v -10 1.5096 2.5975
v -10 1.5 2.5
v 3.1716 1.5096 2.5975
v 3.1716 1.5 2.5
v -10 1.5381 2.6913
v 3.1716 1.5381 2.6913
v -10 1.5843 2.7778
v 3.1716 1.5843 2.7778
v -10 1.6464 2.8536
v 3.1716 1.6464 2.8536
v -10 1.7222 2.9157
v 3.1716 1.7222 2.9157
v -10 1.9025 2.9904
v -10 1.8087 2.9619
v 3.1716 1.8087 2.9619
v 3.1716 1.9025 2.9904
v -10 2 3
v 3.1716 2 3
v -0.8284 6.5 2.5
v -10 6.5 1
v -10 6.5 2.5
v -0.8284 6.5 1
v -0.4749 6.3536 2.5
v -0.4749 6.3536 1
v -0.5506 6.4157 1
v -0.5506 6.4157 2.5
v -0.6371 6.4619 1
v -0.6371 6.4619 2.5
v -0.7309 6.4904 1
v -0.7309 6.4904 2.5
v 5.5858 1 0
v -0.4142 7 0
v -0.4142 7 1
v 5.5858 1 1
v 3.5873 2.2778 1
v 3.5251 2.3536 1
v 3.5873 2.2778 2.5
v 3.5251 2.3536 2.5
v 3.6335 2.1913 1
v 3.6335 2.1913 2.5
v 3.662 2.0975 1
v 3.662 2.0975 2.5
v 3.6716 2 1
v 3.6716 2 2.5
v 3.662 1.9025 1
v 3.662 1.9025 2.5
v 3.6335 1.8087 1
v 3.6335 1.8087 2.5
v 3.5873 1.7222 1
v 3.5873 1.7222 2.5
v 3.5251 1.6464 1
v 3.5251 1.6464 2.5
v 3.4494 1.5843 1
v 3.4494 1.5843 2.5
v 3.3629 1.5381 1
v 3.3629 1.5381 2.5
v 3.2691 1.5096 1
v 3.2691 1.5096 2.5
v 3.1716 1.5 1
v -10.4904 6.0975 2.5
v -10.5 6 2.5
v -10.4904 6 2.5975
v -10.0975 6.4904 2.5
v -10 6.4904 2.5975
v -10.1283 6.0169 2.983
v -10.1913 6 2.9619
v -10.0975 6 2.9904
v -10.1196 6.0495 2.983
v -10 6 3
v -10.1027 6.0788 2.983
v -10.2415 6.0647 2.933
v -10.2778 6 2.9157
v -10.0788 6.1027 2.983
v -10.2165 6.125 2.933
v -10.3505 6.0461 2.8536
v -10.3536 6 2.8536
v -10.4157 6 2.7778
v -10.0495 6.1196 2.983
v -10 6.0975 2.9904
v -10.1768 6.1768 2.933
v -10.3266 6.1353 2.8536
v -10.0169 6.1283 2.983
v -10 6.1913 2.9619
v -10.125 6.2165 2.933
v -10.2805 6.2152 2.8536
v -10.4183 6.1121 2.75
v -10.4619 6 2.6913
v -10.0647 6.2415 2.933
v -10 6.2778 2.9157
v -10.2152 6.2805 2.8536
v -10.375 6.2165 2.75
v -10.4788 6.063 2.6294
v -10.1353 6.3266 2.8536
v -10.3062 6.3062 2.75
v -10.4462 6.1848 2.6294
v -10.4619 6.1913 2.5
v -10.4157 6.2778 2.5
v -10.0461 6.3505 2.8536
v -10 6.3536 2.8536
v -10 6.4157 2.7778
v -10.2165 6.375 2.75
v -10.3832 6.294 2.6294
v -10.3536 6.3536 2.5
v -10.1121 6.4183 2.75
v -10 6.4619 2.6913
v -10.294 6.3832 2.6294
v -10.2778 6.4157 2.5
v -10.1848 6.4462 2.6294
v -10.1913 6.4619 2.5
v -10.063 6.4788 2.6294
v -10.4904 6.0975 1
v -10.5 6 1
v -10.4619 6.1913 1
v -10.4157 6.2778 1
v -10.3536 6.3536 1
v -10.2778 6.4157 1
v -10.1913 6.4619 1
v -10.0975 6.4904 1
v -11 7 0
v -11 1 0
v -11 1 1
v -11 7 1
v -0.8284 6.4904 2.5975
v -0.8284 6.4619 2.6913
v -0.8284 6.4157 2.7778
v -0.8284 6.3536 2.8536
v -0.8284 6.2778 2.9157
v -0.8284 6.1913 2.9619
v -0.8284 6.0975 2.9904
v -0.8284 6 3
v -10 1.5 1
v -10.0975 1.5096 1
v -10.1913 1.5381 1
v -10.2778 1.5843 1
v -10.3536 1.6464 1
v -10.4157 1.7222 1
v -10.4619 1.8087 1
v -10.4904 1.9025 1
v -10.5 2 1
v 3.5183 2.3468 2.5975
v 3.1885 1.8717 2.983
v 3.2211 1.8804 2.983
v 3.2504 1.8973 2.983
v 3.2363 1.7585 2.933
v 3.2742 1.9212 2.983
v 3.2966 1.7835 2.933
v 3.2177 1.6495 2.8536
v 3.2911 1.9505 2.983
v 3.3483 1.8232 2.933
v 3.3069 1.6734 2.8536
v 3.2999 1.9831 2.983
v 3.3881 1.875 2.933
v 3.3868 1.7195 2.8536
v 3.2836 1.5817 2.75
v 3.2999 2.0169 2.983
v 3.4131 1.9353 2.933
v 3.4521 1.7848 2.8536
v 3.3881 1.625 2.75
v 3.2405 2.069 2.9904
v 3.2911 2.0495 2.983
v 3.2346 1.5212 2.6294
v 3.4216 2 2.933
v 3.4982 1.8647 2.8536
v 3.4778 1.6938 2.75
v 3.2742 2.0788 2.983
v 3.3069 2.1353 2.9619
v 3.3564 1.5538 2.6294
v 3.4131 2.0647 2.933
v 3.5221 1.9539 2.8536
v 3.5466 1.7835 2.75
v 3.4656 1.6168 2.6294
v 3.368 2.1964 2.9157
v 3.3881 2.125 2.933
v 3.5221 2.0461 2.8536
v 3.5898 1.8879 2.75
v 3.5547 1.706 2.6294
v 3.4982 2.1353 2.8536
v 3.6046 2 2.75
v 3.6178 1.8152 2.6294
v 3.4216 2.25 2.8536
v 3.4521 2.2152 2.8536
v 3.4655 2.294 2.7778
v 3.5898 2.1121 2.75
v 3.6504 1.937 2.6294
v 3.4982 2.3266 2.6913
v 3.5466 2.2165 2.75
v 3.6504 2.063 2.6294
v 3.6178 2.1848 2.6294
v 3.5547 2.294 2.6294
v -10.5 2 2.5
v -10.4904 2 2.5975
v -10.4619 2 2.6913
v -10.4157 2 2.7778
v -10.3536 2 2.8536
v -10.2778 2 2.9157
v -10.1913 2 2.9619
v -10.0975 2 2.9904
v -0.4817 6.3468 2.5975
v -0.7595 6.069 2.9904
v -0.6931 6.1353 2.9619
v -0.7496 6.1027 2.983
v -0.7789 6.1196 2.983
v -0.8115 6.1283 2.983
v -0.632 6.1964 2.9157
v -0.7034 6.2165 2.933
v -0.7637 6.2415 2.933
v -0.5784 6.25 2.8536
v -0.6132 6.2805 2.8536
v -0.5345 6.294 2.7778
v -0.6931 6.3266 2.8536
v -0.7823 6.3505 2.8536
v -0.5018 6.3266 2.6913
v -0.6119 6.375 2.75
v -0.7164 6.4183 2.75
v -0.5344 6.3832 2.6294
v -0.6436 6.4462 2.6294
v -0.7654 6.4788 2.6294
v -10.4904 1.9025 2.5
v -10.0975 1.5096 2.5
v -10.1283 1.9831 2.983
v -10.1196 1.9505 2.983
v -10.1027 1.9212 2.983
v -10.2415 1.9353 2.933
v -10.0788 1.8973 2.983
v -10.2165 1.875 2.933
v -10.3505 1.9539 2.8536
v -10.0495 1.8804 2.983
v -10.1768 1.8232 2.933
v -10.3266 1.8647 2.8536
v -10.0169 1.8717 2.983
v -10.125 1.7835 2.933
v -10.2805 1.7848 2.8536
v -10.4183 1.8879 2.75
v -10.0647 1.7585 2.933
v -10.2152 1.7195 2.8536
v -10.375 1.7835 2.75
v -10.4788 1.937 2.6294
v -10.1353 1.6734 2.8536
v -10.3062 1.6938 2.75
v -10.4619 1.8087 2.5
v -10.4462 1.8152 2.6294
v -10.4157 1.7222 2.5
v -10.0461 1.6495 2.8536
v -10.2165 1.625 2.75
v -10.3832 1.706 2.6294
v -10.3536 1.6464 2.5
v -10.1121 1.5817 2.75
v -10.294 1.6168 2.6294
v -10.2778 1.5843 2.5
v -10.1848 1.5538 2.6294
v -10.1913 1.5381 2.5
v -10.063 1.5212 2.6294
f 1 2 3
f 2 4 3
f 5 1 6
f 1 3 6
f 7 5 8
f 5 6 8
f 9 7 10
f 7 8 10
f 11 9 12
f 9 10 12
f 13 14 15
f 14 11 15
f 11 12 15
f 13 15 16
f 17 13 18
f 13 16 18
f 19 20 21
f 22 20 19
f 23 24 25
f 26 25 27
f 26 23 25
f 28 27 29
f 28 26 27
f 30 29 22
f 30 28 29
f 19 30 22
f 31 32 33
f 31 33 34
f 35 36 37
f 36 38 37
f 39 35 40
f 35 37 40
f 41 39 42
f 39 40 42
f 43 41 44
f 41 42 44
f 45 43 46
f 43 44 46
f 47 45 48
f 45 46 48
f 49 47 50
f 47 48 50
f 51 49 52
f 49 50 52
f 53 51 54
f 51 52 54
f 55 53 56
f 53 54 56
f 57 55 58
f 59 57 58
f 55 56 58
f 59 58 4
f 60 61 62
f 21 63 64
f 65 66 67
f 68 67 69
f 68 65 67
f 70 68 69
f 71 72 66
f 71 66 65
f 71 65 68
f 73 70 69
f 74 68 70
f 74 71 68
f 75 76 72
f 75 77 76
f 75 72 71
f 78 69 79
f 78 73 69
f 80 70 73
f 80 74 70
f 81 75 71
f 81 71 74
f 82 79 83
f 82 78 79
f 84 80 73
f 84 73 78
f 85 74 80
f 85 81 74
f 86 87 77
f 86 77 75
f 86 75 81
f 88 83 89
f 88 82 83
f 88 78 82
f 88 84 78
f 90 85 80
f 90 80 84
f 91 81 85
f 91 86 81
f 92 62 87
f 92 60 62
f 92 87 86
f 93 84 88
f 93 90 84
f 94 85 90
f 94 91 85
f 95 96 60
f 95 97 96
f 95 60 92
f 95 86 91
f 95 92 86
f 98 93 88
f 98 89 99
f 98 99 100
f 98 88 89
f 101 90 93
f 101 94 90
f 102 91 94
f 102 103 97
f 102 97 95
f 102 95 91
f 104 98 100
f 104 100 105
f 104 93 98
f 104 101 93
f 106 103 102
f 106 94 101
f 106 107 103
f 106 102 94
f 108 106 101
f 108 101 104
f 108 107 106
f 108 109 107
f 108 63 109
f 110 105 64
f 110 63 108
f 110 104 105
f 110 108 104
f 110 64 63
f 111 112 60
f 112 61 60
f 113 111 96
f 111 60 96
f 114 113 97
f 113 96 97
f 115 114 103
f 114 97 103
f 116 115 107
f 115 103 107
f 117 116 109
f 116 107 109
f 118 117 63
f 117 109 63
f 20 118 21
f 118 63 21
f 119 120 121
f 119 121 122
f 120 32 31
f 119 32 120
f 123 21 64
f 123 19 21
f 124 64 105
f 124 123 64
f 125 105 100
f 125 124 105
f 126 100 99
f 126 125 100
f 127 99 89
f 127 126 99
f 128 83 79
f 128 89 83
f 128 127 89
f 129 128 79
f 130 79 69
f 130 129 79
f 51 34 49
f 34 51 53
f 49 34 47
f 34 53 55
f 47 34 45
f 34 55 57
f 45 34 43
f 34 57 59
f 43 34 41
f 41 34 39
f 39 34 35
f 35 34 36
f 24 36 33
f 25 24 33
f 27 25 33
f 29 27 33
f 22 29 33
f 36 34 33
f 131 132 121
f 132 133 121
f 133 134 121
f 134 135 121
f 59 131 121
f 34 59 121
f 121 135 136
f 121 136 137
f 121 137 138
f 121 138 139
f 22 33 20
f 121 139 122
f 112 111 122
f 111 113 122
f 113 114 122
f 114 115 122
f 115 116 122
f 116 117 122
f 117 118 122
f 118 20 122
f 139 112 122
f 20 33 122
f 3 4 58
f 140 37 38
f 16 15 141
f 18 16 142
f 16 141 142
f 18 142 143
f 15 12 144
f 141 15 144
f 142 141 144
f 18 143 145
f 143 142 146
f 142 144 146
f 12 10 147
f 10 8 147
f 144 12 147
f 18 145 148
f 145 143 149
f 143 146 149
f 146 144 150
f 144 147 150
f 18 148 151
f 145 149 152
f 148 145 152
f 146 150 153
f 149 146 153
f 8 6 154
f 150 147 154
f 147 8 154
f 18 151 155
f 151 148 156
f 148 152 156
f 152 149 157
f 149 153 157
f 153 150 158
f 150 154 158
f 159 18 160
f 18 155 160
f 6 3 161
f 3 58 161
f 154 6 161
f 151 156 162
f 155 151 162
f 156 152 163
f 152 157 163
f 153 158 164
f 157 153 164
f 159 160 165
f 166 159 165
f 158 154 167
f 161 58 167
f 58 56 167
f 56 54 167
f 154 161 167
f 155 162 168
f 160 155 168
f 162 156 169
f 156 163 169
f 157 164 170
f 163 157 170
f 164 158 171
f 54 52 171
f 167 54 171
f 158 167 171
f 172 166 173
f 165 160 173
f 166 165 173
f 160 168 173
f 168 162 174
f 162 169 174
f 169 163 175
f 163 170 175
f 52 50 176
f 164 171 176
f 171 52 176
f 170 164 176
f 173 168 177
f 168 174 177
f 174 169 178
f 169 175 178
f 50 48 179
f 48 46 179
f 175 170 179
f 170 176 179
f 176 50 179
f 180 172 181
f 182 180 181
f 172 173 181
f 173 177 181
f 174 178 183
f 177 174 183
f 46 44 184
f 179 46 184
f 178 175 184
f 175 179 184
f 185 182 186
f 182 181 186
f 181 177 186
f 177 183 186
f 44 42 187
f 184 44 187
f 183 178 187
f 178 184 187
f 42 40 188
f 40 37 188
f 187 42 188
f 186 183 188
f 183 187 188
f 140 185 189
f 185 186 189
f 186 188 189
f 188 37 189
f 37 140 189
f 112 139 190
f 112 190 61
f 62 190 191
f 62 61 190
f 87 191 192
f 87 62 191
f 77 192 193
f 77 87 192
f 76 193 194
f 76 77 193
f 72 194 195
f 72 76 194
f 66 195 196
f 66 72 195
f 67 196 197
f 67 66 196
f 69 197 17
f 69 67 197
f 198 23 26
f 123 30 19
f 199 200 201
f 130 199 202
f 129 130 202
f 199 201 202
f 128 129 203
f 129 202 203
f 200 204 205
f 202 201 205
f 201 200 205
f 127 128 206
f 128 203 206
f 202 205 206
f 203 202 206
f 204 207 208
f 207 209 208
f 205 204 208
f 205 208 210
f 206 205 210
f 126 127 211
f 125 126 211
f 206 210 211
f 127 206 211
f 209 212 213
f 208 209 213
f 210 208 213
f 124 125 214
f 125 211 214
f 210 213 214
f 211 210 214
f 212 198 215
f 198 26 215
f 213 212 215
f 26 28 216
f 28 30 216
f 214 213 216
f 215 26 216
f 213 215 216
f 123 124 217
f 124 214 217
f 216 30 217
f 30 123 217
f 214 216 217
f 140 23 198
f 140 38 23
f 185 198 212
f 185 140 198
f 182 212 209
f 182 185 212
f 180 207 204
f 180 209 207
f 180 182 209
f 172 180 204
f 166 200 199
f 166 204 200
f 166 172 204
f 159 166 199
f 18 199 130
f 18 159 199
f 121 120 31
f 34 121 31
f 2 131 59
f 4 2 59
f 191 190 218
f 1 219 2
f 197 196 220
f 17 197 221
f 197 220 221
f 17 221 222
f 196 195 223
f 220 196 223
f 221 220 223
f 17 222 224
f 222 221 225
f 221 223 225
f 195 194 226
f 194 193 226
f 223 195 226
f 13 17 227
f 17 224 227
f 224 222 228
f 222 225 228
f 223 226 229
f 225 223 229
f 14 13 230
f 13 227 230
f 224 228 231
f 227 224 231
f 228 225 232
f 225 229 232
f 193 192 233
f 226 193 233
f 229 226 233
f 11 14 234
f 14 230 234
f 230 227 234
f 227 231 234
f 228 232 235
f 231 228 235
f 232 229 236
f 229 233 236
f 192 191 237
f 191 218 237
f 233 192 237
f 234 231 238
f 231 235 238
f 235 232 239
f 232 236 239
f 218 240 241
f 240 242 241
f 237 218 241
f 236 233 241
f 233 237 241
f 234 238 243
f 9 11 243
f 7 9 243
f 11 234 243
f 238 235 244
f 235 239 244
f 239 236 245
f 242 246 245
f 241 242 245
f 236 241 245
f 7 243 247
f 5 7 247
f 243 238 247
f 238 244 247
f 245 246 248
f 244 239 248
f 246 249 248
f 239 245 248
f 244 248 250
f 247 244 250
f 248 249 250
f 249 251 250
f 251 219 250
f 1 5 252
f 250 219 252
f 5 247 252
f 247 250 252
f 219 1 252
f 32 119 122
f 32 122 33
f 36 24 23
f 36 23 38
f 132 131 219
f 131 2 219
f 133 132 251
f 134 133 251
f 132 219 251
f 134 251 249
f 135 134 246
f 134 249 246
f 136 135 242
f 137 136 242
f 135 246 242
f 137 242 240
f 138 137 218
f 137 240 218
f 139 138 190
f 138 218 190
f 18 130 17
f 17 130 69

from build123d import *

# Parameters (mm, degrees)
BOSS_EXTRUDE3_DEPTH = 1
BOSS_EXTRUDE4_DEPTH = 2
FILLET1_R           = 0.5


with BuildPart() as part:
    # Sketch1 → Boss-Extrude3 (new body)
    with BuildSketch(Plane.XY):
        Polygon((-0.414213562, 7), (5.585786438, 1), (-0.414213562, 1), (-11, 1), (-11, 7), align=None)
    extrude(amount=BOSS_EXTRUDE3_DEPTH)

    # Sketch4 → Boss-Extrude4 (add)
    with BuildSketch(Plane.XY.offset(1)):
        Polygon((-0.621320344, 6.5), (4.378679656, 1.5), (-0.621320344, 1.5), (-10.5, 1.5), (-10.5, 6.5), align=None)
    extrude(amount=BOSS_EXTRUDE4_DEPTH)

    # Fillet1
    fillet1_edges = [part.edges().sort_by_distance(p)[0] for p in [
        (-10.5, 6.5, 2),
        (-10.5, 1.5, 2),
        (4.378679656, 1.5, 2),
        (-0.621320344, 6.5, 2),
        (-10.5, 4, 3),
        (-3.060660172, 1.5, 3),
        (1.878679656, 4, 3),
        (-5.560660172, 6.5, 3),
    ]]
    fillet(fillet1_edges, radius=FILLET1_R)


solid = part.part
